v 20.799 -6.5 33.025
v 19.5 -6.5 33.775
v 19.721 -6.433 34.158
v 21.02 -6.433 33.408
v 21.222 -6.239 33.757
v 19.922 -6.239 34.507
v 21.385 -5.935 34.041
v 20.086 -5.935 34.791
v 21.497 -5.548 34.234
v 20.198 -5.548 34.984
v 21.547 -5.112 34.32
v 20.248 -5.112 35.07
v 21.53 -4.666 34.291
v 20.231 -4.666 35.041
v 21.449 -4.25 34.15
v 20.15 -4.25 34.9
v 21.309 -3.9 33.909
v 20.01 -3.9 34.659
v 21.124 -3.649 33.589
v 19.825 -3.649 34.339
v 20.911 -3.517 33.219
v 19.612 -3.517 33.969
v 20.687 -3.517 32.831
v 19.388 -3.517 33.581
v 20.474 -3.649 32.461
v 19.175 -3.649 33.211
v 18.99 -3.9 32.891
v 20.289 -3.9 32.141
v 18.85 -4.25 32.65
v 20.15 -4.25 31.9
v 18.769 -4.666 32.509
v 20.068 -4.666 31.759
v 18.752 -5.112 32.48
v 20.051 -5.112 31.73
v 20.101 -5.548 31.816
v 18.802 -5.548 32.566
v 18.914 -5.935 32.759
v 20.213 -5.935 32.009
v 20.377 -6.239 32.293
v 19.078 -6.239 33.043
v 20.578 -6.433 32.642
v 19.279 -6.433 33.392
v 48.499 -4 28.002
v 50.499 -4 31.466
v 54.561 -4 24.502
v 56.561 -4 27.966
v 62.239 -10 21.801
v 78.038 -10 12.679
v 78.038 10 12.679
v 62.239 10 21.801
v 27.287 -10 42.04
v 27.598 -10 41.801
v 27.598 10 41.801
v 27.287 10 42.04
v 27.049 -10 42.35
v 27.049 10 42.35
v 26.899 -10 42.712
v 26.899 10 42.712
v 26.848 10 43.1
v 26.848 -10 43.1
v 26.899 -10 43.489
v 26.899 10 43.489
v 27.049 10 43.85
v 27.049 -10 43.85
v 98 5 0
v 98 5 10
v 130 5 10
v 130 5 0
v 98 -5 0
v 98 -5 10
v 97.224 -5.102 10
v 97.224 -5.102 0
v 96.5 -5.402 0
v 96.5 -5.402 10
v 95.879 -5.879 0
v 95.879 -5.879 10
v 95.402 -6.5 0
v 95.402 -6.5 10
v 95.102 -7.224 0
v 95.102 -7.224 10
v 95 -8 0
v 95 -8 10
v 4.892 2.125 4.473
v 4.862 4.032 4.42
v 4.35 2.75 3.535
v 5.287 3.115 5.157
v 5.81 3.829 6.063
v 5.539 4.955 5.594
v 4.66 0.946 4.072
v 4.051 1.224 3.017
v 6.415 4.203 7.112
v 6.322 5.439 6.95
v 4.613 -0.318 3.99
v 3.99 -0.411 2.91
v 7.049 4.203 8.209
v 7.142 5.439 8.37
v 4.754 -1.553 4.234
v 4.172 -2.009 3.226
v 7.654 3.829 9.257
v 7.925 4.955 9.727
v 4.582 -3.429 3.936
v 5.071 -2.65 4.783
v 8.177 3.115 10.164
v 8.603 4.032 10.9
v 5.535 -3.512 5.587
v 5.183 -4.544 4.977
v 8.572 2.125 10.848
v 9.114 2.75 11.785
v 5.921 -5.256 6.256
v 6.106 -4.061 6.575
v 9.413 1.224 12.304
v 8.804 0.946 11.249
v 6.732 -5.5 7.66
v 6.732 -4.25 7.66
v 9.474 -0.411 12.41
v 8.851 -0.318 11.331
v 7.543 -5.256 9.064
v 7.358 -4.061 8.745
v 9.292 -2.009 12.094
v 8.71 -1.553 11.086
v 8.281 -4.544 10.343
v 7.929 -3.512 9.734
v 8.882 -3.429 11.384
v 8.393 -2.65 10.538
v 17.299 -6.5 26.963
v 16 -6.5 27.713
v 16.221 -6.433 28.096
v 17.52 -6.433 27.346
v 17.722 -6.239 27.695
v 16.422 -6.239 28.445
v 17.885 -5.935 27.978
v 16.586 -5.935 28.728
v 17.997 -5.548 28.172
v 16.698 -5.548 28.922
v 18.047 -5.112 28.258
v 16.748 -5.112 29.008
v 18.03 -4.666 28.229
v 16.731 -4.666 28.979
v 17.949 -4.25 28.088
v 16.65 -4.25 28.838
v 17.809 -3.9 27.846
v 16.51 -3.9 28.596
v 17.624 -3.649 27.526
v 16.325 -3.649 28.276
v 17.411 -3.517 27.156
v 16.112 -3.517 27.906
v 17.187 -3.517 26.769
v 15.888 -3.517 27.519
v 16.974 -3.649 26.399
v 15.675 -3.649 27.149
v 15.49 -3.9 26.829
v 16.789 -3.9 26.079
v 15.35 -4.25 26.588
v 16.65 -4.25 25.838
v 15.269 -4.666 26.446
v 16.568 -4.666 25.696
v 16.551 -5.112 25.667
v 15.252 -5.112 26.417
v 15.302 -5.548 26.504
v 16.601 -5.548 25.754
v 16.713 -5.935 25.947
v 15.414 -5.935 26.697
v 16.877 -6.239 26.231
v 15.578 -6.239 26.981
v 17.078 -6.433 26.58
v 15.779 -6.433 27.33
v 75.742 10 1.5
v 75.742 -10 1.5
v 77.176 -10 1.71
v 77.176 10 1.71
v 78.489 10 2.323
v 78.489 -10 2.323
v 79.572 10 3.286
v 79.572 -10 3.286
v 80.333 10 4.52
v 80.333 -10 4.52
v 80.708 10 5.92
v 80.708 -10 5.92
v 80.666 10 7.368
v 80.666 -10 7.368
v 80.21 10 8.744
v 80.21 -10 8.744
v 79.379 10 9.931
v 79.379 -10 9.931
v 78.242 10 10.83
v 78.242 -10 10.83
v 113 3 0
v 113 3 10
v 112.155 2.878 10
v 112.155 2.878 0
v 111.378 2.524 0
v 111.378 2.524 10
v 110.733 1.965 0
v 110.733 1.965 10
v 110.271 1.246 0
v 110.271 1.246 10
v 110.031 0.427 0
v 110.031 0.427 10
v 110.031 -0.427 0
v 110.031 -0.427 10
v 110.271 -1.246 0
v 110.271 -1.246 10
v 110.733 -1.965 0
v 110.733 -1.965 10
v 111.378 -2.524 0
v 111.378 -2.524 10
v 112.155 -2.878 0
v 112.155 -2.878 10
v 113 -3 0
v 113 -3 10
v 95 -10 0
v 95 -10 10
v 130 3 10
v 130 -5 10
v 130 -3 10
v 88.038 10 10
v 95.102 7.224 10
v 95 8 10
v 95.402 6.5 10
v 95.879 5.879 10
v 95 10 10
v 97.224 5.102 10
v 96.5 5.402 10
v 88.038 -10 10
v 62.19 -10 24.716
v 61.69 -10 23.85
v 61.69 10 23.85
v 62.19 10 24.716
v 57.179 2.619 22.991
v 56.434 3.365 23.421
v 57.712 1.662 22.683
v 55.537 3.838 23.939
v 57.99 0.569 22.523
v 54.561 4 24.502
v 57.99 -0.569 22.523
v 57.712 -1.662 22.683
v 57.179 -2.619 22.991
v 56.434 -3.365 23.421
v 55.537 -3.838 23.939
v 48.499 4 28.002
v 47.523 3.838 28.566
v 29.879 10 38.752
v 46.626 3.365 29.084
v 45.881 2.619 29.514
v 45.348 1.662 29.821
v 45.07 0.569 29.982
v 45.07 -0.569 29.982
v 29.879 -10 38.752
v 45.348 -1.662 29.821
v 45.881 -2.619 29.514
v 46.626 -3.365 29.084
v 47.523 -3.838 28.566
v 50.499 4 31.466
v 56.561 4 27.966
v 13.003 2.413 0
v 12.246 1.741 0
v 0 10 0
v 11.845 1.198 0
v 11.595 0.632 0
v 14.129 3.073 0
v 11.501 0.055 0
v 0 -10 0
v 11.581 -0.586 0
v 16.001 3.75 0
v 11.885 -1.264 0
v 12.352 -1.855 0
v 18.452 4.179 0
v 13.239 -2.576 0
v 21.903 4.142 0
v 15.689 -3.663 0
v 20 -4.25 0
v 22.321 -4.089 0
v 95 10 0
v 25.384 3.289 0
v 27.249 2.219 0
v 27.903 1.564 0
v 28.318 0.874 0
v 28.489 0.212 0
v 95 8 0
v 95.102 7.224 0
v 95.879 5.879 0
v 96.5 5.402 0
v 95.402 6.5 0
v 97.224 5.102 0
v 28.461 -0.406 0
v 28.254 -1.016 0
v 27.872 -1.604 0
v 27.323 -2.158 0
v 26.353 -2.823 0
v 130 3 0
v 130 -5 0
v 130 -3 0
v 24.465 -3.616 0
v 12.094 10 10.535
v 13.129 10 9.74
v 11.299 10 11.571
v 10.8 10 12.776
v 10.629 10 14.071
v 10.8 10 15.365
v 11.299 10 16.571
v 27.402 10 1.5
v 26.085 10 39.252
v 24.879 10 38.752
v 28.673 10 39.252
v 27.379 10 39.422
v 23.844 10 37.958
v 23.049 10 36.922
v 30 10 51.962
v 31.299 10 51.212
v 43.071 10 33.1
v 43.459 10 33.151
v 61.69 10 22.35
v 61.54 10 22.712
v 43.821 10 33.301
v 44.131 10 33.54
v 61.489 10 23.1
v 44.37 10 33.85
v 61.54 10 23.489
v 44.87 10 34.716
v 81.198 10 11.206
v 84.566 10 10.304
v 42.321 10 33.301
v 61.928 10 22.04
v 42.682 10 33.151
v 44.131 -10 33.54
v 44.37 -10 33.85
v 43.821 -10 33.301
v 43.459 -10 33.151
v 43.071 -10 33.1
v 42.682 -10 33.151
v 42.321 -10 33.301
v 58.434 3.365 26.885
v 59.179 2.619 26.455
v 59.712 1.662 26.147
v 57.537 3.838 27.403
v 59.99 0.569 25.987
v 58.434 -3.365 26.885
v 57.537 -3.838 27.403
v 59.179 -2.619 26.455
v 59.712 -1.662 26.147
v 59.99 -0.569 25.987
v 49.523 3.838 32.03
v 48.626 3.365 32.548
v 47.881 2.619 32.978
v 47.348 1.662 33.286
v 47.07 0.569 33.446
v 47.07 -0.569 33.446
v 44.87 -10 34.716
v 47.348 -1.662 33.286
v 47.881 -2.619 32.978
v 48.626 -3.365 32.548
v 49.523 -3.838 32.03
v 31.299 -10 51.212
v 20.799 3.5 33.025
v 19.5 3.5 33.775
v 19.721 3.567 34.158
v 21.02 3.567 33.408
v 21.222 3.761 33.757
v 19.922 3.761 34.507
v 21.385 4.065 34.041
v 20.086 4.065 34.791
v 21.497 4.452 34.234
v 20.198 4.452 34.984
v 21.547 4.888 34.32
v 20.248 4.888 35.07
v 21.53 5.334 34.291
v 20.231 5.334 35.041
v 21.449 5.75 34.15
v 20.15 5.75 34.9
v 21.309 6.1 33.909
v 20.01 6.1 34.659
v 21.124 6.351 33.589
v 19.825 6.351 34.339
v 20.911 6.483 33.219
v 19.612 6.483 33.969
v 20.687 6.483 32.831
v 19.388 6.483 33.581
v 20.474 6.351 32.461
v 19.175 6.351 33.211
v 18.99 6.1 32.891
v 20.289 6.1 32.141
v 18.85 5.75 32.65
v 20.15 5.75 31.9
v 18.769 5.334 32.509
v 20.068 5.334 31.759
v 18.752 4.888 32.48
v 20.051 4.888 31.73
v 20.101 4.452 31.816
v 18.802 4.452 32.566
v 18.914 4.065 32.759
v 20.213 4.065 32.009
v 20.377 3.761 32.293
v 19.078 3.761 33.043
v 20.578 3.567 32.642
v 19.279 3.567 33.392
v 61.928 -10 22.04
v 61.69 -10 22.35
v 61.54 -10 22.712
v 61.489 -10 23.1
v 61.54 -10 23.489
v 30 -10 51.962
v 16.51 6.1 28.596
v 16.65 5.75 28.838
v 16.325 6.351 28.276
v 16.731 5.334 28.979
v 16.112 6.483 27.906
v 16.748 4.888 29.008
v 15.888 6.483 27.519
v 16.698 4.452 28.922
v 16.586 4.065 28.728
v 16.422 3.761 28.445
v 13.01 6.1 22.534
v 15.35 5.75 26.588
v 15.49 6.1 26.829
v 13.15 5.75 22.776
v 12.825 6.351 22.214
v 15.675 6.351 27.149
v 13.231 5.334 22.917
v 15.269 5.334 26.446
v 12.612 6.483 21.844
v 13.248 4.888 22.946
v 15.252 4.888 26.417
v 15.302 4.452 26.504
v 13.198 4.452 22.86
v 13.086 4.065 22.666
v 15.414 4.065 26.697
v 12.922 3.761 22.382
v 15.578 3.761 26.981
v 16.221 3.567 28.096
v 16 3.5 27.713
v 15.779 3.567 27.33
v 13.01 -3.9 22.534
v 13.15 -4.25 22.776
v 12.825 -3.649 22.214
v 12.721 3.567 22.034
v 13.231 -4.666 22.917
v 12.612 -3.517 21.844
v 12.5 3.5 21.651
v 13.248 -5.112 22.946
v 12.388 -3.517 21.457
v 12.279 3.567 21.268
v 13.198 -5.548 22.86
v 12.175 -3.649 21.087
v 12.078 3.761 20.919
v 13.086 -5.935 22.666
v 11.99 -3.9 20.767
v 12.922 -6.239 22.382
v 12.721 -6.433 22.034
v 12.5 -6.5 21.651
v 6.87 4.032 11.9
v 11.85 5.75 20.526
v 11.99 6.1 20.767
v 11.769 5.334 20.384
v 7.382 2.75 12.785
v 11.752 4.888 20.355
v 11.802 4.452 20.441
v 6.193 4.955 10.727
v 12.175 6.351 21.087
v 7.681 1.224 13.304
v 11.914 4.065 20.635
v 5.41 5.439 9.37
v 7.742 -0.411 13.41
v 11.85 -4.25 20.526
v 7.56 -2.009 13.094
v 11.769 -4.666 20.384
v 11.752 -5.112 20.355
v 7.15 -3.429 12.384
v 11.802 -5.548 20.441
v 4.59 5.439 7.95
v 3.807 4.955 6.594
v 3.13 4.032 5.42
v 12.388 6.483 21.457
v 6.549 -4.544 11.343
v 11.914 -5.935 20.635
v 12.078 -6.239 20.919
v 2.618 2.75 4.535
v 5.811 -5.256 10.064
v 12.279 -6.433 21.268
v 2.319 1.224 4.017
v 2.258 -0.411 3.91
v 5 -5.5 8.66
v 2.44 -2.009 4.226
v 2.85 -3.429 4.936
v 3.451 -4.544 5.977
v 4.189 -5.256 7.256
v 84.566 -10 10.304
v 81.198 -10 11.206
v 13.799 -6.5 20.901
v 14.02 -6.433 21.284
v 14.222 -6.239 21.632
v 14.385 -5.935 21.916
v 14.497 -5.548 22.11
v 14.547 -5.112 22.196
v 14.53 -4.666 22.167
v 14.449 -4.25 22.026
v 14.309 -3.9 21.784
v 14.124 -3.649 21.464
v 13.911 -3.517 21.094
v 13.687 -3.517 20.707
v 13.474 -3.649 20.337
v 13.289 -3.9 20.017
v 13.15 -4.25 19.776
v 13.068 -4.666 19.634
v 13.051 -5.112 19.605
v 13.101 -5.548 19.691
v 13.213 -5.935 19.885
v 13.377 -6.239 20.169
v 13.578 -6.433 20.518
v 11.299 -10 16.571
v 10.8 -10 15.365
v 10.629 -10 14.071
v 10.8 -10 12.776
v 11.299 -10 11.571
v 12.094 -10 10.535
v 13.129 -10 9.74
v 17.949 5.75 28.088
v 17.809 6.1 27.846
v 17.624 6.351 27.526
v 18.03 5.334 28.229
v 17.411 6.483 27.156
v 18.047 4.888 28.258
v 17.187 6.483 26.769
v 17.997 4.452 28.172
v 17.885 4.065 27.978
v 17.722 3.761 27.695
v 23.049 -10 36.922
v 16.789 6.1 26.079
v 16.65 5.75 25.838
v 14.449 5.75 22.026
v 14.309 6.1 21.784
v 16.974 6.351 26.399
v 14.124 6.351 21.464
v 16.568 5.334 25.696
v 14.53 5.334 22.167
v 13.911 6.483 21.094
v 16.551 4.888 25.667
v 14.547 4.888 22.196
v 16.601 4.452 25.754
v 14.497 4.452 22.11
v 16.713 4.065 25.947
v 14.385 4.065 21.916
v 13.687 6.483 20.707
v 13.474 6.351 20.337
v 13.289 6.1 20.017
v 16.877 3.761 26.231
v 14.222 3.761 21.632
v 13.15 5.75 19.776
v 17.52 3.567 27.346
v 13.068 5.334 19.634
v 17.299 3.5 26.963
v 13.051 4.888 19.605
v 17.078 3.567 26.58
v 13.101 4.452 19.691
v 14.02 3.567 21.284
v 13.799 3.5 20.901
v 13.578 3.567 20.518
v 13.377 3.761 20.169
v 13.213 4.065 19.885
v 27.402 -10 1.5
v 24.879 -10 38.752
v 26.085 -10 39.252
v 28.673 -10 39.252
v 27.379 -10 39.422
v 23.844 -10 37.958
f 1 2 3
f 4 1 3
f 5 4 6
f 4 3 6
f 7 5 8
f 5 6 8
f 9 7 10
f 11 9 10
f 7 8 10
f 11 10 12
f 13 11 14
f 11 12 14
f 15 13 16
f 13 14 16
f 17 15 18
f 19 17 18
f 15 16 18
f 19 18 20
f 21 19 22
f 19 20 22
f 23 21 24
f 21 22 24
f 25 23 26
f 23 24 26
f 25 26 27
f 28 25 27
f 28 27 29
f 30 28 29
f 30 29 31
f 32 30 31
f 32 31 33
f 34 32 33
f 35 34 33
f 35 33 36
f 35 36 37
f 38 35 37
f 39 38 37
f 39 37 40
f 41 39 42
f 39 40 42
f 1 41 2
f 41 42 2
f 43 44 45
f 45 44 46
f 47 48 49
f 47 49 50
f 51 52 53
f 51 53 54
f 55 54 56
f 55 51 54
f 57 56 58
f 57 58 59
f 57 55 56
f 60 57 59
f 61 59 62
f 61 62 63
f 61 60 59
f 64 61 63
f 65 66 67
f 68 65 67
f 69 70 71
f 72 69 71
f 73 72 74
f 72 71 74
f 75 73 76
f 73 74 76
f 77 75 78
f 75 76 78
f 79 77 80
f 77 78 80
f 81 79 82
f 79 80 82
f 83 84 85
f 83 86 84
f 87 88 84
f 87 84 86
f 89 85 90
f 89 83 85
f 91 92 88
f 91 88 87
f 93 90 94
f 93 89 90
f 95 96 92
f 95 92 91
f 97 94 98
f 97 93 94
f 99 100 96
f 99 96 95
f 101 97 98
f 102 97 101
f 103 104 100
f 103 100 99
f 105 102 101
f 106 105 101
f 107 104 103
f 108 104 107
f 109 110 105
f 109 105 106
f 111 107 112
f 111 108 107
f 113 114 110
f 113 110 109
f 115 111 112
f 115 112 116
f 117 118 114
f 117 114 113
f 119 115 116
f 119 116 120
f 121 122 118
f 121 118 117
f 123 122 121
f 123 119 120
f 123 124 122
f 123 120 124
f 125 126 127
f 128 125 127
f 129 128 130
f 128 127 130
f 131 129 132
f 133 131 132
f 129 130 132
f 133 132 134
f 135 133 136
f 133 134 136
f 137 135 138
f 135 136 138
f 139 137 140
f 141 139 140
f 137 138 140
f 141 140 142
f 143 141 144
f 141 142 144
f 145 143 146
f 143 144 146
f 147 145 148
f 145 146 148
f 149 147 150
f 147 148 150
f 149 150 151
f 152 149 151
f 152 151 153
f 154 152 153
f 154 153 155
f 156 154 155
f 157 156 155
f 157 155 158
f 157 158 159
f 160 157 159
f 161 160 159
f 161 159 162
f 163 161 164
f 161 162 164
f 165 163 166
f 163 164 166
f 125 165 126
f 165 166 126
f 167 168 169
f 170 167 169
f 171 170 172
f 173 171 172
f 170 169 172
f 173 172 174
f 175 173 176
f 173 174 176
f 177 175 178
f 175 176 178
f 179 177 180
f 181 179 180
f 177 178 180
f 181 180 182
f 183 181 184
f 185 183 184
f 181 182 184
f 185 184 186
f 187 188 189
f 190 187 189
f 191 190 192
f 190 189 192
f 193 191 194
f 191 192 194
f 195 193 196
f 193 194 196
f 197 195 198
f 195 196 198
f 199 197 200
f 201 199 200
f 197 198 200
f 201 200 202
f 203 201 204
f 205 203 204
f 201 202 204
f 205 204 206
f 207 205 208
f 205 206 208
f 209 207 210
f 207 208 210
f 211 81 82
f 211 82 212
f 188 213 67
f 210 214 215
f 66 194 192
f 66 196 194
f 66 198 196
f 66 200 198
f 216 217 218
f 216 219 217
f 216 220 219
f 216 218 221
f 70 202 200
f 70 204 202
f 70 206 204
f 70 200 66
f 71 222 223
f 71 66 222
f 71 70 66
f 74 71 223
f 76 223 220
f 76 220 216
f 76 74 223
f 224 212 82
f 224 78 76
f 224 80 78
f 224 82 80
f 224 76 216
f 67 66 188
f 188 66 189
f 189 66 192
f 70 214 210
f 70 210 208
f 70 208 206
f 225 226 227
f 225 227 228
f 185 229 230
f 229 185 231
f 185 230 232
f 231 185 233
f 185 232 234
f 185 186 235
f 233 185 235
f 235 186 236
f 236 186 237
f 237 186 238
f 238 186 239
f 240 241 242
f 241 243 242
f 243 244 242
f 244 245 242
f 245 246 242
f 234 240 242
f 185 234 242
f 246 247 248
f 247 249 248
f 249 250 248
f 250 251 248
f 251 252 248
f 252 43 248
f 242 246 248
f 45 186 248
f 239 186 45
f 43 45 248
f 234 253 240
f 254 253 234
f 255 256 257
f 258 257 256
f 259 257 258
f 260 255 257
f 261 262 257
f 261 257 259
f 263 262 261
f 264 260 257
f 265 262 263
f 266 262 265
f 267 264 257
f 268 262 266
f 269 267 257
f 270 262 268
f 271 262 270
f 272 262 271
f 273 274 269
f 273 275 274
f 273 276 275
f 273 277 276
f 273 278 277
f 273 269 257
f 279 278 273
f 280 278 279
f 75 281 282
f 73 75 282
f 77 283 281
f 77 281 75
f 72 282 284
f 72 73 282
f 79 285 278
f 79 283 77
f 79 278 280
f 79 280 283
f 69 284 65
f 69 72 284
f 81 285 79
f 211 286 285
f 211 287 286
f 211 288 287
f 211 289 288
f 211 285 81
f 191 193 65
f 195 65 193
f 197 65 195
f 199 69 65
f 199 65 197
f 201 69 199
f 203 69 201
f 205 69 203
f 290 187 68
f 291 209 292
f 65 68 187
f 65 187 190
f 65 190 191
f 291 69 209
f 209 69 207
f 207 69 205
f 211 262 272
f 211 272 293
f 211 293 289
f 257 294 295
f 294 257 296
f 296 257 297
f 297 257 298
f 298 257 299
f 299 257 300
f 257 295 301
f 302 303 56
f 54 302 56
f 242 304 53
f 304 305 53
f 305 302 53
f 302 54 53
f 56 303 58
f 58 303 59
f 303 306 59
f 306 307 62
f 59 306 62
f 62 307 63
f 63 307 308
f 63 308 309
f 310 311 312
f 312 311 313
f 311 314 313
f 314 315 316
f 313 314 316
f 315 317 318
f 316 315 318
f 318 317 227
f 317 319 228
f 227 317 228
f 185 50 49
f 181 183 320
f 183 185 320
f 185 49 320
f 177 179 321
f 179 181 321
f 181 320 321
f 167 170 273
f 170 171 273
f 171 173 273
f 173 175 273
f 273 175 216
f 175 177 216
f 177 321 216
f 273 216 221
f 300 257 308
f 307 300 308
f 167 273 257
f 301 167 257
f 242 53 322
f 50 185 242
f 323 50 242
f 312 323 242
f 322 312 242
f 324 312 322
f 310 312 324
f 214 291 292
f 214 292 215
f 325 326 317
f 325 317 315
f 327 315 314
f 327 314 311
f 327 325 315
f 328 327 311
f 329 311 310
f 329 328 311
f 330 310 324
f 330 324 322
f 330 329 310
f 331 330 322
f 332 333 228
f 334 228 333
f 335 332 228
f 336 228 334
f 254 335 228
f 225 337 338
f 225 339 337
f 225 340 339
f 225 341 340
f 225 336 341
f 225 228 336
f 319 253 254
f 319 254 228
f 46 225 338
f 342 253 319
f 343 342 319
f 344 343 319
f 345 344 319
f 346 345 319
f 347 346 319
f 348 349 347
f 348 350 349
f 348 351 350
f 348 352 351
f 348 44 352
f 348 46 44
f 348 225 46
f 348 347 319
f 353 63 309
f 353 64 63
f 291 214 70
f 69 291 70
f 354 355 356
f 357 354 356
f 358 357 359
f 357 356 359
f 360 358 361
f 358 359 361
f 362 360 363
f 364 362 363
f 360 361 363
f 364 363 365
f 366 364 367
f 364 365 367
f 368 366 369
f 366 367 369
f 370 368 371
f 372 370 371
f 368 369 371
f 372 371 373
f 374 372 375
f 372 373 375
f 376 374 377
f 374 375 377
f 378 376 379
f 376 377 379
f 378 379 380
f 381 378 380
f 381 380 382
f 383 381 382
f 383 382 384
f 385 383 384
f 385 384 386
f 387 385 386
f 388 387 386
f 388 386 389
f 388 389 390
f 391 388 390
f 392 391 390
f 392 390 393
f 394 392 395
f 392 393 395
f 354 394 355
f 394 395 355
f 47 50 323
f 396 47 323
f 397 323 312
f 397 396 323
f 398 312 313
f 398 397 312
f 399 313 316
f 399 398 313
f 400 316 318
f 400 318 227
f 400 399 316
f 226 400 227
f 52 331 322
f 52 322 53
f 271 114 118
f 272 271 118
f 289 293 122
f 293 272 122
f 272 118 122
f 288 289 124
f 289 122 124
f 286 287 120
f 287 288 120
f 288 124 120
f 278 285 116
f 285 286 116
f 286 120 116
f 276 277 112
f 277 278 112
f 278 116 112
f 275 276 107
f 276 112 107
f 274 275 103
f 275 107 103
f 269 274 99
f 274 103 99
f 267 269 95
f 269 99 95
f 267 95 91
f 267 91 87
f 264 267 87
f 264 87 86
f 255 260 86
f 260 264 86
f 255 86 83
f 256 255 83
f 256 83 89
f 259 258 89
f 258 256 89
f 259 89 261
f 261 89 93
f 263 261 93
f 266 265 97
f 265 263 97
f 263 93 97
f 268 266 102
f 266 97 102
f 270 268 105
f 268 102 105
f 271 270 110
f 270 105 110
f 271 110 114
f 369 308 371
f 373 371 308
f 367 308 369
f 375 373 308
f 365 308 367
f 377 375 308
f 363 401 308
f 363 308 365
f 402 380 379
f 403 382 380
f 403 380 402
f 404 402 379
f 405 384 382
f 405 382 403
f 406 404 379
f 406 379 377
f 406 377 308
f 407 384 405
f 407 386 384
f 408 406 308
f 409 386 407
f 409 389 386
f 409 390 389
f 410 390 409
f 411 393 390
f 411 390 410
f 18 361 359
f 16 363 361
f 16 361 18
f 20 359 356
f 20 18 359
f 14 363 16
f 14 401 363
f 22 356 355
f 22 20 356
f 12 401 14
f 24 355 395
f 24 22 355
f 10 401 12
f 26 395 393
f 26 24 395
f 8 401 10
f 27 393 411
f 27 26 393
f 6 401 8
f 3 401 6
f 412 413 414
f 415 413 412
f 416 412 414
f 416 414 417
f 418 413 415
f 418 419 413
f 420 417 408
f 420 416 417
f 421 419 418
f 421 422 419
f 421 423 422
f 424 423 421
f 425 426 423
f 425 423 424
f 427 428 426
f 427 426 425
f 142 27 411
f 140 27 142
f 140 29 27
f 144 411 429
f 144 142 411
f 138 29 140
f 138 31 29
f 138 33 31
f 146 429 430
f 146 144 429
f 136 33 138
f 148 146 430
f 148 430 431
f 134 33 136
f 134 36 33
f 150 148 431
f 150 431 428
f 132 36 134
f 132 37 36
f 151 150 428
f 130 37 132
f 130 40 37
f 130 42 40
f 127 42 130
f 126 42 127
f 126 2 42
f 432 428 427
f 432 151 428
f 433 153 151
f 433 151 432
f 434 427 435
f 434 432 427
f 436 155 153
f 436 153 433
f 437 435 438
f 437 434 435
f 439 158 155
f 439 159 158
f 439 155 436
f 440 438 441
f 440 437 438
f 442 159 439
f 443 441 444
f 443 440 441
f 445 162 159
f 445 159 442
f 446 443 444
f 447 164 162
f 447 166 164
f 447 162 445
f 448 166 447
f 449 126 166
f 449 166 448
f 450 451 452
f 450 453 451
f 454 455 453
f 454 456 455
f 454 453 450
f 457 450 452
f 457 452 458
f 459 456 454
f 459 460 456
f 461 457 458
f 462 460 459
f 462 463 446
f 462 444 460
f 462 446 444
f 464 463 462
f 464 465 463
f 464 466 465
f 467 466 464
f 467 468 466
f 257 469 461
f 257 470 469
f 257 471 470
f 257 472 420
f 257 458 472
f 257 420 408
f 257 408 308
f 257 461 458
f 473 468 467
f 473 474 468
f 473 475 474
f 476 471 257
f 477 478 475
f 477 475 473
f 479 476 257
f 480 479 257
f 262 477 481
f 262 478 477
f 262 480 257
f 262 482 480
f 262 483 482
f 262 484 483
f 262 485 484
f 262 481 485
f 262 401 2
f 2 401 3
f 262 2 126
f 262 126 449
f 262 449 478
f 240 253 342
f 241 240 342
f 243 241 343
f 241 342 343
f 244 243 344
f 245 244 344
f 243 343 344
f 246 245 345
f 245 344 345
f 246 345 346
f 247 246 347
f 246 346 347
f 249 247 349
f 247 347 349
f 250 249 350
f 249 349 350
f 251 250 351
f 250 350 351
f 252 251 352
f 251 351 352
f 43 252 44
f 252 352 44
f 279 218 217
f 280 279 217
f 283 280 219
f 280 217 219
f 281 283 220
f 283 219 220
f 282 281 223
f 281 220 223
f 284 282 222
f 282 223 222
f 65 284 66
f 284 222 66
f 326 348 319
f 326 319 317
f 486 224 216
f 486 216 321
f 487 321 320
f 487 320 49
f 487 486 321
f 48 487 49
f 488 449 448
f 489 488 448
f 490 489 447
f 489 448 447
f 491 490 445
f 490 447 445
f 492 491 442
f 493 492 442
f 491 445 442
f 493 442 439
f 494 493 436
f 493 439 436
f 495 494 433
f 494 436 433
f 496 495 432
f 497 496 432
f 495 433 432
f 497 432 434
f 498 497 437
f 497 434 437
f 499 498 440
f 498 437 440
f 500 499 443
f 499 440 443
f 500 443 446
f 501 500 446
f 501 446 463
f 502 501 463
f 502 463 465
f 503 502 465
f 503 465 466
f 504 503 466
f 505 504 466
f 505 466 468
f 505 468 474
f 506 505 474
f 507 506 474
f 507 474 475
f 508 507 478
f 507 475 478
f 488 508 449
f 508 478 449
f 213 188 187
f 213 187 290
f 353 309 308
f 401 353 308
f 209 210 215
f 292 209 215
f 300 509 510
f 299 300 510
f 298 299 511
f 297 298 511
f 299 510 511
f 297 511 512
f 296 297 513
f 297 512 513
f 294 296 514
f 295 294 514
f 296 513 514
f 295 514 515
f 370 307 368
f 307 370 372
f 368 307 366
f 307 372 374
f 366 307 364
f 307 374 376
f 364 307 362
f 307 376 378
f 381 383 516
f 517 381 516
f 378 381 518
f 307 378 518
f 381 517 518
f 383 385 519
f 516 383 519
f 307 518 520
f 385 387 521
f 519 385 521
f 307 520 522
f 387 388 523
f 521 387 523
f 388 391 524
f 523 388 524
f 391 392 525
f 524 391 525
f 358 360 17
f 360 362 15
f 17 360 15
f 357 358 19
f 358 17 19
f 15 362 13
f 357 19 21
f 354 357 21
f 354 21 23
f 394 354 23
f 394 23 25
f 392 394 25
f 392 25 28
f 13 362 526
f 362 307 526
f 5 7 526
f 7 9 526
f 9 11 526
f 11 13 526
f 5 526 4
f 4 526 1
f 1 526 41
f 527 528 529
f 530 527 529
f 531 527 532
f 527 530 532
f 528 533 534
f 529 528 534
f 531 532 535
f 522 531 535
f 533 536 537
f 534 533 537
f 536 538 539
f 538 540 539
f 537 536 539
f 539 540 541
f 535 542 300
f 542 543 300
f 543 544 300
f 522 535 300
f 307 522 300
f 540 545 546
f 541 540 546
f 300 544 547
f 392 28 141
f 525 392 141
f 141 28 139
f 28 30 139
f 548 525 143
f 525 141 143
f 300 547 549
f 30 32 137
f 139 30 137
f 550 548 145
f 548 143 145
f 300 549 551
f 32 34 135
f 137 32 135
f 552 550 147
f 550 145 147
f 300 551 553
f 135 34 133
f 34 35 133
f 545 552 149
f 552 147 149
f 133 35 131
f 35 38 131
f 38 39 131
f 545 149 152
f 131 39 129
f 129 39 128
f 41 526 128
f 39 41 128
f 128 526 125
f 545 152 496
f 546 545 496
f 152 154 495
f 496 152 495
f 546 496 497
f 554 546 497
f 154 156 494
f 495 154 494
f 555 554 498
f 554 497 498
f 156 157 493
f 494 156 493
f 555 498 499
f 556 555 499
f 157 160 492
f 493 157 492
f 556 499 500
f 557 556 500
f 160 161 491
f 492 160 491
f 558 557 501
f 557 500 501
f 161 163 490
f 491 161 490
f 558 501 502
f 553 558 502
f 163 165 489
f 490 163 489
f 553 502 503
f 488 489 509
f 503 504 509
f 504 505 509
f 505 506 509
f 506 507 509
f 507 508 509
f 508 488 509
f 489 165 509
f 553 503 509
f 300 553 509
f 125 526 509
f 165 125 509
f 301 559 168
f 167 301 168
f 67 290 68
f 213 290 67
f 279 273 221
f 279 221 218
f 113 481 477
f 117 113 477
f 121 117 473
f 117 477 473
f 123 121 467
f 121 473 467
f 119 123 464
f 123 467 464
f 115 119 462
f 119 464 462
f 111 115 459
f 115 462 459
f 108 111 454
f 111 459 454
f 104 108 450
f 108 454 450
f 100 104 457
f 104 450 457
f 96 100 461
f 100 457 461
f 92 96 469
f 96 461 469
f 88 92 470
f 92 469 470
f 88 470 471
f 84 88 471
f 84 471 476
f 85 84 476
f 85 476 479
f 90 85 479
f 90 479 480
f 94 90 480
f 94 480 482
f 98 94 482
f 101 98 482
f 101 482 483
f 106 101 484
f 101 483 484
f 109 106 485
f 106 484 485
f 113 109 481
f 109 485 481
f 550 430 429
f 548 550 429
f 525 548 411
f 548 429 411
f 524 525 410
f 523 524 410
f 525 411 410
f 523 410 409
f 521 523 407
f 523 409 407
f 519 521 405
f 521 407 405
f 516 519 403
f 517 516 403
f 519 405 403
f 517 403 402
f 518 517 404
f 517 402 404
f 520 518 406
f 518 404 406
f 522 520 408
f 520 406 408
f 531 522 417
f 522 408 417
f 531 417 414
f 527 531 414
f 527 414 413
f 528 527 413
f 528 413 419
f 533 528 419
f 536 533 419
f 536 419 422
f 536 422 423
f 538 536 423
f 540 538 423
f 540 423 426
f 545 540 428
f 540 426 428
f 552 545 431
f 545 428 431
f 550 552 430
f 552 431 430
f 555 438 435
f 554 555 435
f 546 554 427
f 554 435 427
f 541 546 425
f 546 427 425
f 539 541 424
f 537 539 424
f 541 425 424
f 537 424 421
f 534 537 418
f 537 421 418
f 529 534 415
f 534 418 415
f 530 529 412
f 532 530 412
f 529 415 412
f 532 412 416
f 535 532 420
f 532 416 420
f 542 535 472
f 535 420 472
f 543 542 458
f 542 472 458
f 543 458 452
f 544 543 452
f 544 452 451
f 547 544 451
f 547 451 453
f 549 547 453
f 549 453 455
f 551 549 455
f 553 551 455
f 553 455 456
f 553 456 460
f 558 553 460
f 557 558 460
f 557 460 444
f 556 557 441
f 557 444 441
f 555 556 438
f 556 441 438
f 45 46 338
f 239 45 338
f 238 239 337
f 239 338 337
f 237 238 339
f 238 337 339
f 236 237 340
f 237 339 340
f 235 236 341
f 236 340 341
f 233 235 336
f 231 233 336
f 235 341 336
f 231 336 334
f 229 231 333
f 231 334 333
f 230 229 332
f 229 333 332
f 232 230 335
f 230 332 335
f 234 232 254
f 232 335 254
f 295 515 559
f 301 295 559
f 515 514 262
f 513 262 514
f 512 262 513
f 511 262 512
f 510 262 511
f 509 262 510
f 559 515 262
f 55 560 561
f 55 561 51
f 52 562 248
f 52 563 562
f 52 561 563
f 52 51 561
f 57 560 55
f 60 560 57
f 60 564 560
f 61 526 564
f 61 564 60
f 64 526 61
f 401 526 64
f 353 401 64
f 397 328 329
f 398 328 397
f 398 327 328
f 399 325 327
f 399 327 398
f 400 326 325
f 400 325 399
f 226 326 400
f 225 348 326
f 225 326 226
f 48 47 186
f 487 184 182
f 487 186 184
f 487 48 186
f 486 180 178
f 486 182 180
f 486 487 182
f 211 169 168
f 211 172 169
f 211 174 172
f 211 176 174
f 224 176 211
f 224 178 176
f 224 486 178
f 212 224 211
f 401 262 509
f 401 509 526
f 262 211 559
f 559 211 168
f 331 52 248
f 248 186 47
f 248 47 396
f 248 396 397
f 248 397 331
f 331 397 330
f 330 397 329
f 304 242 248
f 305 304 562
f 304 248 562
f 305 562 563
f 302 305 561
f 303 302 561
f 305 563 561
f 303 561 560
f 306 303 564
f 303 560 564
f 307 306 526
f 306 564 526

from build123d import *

# Parameters (mm, degrees)
F1_DEPTH      = 10
F3_DEPTH      = 20.001
F3_DEPTH_BACK = 197
F4_R          = 1.5
F5_DEPTH      = 1.5
F4_R_2        = 4.25
F6_DEPTH      = 112.584302492
F4_R_3        = 5.5
F7_DEPTH      = 2
F8_W          = 17
F8_H          = 6
F9_DEPTH      = 10.001
F10_W         = 7
F10_H         = 8
F11_DEPTH     = 4


# Not quite as in the source:
# - an extrude ends at something that could not be found from the text; its depth is read off the source's solid


with BuildPart() as f1:
    # F0 (on Front) → F1 (new body, symmetric)
    with BuildSketch(Plane.XZ):
        with BuildLine():
            Line((30, 51.9615242271), (0, 0))
            Line((0, 0), (130, 0))
            Line((130, 0), (130, 10))
            Line((130, 10), (88.0384757729, 10))
            ThreePointArc((88.0384757729, 10), (82.8620948709, 10.6814834742), (78.0384757729, 12.6794919243))
            Line((78.0384757729, 12.6794919243), (62.2390923627, 21.8012701892))
            ThreePointArc((62.2390923627, 21.8012701892), (61.5402036233, 22.7120797272), (61.6900542571, 23.8503082949))
            Line((61.6900542571, 23.8503082949), (62.1900542571, 24.7163336987))
            Line((62.1900542571, 24.7163336987), (44.8695461814, 34.7163336987))
            Line((44.8695461814, 34.7163336987), (44.3695461814, 33.8503082949))
            ThreePointArc((44.3695461814, 33.8503082949), (43.4587366433, 33.1514195555), (42.3205080757, 33.3012701892))
            Line((42.3205080757, 33.3012701892), (27.5980762114, 41.8012701892))
            ThreePointArc((27.5980762114, 41.8012701892), (26.8991874719, 42.7120797272), (27.0490381057, 43.8503082949))
            Line((27.0490381057, 43.8503082949), (31.2990381057, 51.2115242271))
            Line((31.2990381057, 51.2115242271), (30, 51.9615242271))
        make_face()
        with BuildLine():
            ThreePointArc((23.0490381057, 36.9221050646), (26.0850698991, 39.2517341961), (29.8791651246, 38.7522320835))
            Line((29.8791651246, 38.7522320835), (78.2416697508, 10.8301270189))
            ThreePointArc((78.2416697508, 10.8301270189), (80.5712988822, 5.2059047745), (75.7416697508, 1.5))
            Line((75.7416697508, 1.5), (27.4019237886, 1.5))
            Line((27.4019237886, 1.5), (13.1291651246, 9.7403810568))
            ThreePointArc((13.1291651246, 9.7403810568), (10.7995359932, 12.7764128502), (11.2990381057, 16.5705080757))
            Line((11.2990381057, 16.5705080757), (23.0490381057, 36.9221050646))
        make_face(mode=Mode.SUBTRACT)
        with BuildLine():
            Line((78.2416697508, 10.8301270189), (29.8791651246, 38.7522320835))
            ThreePointArc((29.8791651246, 38.7522320835), (26.0850698991, 39.2517341961), (23.0490381057, 36.9221050646))
            Line((23.0490381057, 36.9221050646), (11.2990381057, 16.5705080757))
            ThreePointArc((11.2990381057, 16.5705080757), (10.7995359932, 12.7764128502), (13.1291651246, 9.7403810568))
            Line((13.1291651246, 9.7403810568), (27.4019237886, 1.5))
            Line((27.4019237886, 1.5), (75.7416697508, 1.5))
            ThreePointArc((75.7416697508, 1.5), (80.5712988822, 5.2059047745), (78.2416697508, 10.8301270189))
        make_face()
    extrude(amount=F1_DEPTH, both=True)

    # F2 (on face) → F3 (cut, two sides)
    with BuildSketch(Plane.XZ.offset(10)) as f3_sk:
        with BuildLine():
            ThreePointArc((29.8791651246, 38.7522320835), (26.0850698991, 39.2517341961), (23.0490381057, 36.9221050646))
            Line((23.0490381057, 36.9221050646), (11.2990381057, 16.5705080757))
            ThreePointArc((11.2990381057, 16.5705080757), (10.7995359932, 12.7764128502), (13.1291651246, 9.7403810568))
            Line((13.1291651246, 9.7403810568), (27.4019237886, 1.5))
            Line((27.4019237886, 1.5), (75.7416697508, 1.5))
            ThreePointArc((75.7416697508, 1.5), (80.5712988822, 5.2059047745), (78.2416697508, 10.8301270189))
            Line((78.2416697508, 10.8301270189), (29.8791651246, 38.7522320835))
        make_face()
    extrude(amount=-F3_DEPTH, mode=Mode.SUBTRACT)
    extrude(f3_sk.sketch, amount=F3_DEPTH_BACK, mode=Mode.SUBTRACT)

    # F4 (on face) → F5 (cut, through all)
    with BuildSketch(Plane(origin=(0, 0, 0), x_dir=(0, -1, 0), z_dir=(-0.8660254038, 0, 0.5))):
        with Locations((-5, 25)):
            Circle(F4_R)
        with Locations((-5, 32)):
            Circle(F4_R)
        with Locations((-5, 39)):
            Circle(F4_R)
        with Locations((5, 39)):
            Circle(F4_R)
        with Locations((5, 32)):
            Circle(F4_R)
        with Locations((5, 25)):
            Circle(F4_R)
    extrude(amount=-F5_DEPTH, mode=Mode.SUBTRACT)

    # F4 (on face) → F6 (cut, through all)
    with BuildSketch(Plane(origin=(0, 0, 0), x_dir=(0, -1, 0), z_dir=(-0.8660254038, 0, 0.5))):
        with Locations((0, 10)):
            Circle(F4_R_2)
    extrude(amount=-F6_DEPTH, mode=Mode.SUBTRACT)

    # F4 (on face) → F7 (cut)
    with BuildSketch(Plane(origin=(0, 0, 0), x_dir=(0, -1, 0), z_dir=(-0.8660254038, 0, 0.5))):
        with Locations((0, 10)):
            Circle(F4_R_3)
        with Locations((0, 10)):
            Circle(F4_R_2, mode=Mode.SUBTRACT)
    extrude(amount=-F7_DEPTH, mode=Mode.SUBTRACT)

    # F8 (on face) → F9 (cut, through all)
    with BuildSketch(Plane.XY.offset(10)):
        with Locations((121.5, 0)):
            Rectangle(F8_W, F8_H)
        with BuildLine():
            ThreePointArc((113, 3), (110, 0), (113, -3))
            Line((113, -3), (113, 3))
        make_face()
        with BuildLine():
            Line((130, -10), (130, -5))
            Line((130, -5), (98, -5))
            ThreePointArc((98, -5), (95.8786796564, -5.8786796564), (95, -8))
            Line((95, -8), (95, -10))
            Line((95, -10), (130, -10))
        make_face()
        with BuildLine():
            Line((98, 5), (130, 5))
            Line((130, 5), (130, 10))
            Line((130, 10), (95, 10))
            Line((95, 10), (95, 8))
            ThreePointArc((95, 8), (95.8786796564, 5.8786796564), (98, 5))
        make_face()
    extrude(amount=-F9_DEPTH, mode=Mode.SUBTRACT)

    # F10 (on face) → F11 (cut, through all)
    with BuildSketch(Plane(origin=(26.25, 0, 45.4663336987), x_dir=(0.8660254038, 0, -0.5), z_dir=(0.5, 0, 0.8660254038))):
        with BuildLine():
            ThreePointArc((28, 4), (24, 0), (28, -4))
            Line((28, -4), (28, 4))
        make_face()
        with Locations((31.5, 0)):
            Rectangle(F10_W, F10_H)
        with BuildLine():
            Line((35, 4), (35, -4))
            ThreePointArc((35, -4), (39, 0), (35, 4))
        make_face()
    extrude(amount=-F11_DEPTH, mode=Mode.SUBTRACT)


solid = f1.part
